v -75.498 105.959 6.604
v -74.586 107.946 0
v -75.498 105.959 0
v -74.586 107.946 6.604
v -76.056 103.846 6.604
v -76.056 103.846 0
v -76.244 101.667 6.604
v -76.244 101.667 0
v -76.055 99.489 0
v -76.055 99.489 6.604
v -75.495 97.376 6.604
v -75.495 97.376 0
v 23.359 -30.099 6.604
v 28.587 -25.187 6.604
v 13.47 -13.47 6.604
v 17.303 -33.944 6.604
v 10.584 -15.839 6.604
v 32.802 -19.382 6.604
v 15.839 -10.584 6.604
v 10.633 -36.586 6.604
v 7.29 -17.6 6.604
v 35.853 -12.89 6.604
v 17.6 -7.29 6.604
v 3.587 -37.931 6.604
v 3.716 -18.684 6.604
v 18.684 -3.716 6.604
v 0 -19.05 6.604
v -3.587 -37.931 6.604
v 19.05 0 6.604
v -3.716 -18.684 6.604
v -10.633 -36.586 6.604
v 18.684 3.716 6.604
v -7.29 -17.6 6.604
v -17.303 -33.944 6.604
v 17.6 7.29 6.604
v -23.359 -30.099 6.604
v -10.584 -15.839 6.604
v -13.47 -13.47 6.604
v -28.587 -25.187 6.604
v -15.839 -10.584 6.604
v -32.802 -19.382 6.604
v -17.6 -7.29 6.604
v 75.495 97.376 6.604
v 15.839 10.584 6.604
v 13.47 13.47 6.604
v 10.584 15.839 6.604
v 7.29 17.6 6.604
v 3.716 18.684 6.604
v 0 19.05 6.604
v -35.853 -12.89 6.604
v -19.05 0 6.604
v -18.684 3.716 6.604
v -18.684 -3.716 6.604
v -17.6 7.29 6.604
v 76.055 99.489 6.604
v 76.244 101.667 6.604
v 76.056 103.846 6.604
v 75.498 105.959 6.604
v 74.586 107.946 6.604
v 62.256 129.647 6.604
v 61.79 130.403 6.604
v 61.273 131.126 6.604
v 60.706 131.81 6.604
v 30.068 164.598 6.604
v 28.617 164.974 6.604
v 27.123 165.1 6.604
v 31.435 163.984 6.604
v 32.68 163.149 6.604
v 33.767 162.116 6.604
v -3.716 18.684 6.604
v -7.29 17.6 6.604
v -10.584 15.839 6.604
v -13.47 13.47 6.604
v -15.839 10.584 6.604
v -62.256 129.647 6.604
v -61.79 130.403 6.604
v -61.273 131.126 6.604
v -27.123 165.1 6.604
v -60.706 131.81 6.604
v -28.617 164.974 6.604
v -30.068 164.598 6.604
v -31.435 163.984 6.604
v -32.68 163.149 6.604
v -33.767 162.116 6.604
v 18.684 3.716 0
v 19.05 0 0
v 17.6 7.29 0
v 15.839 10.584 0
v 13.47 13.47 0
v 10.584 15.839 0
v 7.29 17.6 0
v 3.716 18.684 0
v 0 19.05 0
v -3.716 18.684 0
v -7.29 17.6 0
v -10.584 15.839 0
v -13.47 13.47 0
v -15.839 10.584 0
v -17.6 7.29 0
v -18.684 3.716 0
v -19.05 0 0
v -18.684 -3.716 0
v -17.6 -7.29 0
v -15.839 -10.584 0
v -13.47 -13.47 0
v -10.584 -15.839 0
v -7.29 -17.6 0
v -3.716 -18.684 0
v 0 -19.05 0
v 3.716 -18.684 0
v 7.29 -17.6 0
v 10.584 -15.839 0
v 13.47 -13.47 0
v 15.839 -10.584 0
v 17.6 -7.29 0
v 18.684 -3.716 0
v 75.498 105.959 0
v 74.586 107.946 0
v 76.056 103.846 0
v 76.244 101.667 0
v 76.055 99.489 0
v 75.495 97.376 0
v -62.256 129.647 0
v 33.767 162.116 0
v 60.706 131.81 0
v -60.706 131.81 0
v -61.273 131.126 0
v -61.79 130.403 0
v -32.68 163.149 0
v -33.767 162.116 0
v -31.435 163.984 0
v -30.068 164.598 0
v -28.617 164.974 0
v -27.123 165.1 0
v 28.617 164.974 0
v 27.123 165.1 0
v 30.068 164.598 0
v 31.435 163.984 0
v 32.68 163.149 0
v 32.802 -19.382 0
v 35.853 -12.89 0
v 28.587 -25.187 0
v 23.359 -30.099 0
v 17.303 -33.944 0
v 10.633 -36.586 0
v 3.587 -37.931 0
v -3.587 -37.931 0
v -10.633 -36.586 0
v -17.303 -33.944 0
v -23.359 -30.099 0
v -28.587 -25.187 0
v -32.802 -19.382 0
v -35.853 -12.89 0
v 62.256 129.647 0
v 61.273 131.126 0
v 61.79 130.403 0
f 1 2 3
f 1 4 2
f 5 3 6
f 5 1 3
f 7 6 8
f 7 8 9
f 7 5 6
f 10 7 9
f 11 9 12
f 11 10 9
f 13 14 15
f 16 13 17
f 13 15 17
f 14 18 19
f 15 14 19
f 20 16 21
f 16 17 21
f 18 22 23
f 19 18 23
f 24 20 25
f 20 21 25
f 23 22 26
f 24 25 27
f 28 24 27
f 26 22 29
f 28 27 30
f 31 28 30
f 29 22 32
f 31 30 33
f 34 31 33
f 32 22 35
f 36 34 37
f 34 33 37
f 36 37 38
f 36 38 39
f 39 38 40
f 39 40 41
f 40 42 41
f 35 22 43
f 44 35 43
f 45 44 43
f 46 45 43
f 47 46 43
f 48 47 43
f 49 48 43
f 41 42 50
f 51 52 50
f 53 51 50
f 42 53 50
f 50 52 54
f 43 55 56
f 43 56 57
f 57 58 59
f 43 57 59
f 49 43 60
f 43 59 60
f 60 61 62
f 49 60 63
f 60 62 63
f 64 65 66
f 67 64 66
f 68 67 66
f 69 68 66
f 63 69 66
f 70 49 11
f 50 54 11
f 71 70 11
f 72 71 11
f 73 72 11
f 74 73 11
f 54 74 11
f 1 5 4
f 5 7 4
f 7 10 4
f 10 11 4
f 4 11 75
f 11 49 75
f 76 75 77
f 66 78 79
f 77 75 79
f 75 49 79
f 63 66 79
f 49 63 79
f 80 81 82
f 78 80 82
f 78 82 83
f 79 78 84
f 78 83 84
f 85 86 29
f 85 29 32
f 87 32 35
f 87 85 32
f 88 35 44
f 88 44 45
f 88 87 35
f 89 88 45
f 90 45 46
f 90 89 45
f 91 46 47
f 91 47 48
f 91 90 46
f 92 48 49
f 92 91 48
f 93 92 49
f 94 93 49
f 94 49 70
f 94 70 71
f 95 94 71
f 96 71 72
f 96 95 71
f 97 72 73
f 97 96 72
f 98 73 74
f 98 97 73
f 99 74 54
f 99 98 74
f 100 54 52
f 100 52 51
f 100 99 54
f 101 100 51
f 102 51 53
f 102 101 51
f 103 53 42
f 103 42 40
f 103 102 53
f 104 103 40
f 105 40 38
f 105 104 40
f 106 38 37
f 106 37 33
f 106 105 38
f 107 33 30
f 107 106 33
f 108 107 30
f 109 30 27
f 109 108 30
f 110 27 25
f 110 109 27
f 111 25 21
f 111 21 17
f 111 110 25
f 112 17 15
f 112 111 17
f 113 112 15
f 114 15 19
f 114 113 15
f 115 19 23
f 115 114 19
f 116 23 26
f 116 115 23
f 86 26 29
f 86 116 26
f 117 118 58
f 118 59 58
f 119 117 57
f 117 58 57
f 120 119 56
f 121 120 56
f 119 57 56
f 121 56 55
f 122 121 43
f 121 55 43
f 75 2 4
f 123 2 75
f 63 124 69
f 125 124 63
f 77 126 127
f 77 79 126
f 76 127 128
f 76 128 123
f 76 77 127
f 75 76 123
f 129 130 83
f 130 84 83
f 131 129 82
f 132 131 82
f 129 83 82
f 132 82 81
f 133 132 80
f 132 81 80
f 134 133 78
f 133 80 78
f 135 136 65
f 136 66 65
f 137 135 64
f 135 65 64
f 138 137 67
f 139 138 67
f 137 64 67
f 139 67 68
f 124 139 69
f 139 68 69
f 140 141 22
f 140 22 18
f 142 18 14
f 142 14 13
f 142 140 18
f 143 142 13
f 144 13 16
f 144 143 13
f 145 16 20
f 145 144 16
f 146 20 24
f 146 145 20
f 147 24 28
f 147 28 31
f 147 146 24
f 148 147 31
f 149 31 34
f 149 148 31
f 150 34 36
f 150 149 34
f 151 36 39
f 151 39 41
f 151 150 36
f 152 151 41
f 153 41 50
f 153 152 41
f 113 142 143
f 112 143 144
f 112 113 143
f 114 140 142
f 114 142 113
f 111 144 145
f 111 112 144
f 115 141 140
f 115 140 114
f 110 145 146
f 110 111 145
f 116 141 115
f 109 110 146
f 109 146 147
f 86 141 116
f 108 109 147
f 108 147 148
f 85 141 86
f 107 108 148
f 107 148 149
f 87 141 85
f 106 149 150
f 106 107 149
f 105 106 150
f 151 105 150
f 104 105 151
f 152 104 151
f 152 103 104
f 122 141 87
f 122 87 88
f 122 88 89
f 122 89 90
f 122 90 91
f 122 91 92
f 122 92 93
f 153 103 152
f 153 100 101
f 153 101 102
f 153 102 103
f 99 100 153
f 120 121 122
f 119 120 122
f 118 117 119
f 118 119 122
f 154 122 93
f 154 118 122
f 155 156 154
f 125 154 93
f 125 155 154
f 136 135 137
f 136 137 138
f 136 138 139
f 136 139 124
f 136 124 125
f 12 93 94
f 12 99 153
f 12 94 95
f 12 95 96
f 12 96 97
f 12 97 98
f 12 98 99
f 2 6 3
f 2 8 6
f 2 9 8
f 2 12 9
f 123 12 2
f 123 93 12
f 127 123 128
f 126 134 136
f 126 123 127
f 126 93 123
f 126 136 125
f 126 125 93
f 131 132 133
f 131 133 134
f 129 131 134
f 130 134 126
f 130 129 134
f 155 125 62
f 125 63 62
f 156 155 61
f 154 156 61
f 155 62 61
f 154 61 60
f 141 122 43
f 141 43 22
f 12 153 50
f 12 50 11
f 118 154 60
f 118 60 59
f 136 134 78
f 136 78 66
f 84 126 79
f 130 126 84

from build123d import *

# Parameters (mm, degrees)
SKETCH1_R           = 19.05
BOSS_EXTRUDE1_DEPTH = 6.604
FILLET1_R           = 12.7
FILLET2_R           = 8.89


with BuildPart() as part:
    # Sketch1 → Boss-Extrude1 (new body)
    with BuildSketch(Plane.XY):
        with BuildLine():
            Line((-31.115, 165.1), (31.115, 165.1))
            Line((31.115, 165.1), (61.595, 130.81))
            Line((61.595, 130.81), (77.47, 102.87))
            Line((77.47, 102.87), (35.853421773, -12.889613927))
            ThreePointArc((35.853421773, -12.889613927), (0, -38.1), (-35.853421773, -12.889613927))
            Line((-35.853421773, -12.889613927), (-77.47, 102.87))
            Line((-77.47, 102.87), (-61.595, 130.81))
            Line((-61.595, 130.81), (-31.115, 165.1))
        make_face()
        Circle(SKETCH1_R, mode=Mode.SUBTRACT)
    extrude(amount=BOSS_EXTRUDE1_DEPTH)

    # Fillet1
    fillet1_edges = [part.edges().sort_by_distance(p)[0] for p in [
        (61.595, 130.81, 3.302),
        (77.47, 102.87, 3.302),
        (-77.47, 102.87, 3.302),
        (-61.595, 130.81, 3.302),
    ]]
    fillet(fillet1_edges, radius=FILLET1_R)

    # Fillet2
    fillet2_edges = [part.edges().sort_by_distance(p)[0] for p in [
        (-31.115, 165.1, 3.302),
        (31.115, 165.1, 3.302),
    ]]
    fillet(fillet2_edges, radius=FILLET2_R)


solid = part.part
